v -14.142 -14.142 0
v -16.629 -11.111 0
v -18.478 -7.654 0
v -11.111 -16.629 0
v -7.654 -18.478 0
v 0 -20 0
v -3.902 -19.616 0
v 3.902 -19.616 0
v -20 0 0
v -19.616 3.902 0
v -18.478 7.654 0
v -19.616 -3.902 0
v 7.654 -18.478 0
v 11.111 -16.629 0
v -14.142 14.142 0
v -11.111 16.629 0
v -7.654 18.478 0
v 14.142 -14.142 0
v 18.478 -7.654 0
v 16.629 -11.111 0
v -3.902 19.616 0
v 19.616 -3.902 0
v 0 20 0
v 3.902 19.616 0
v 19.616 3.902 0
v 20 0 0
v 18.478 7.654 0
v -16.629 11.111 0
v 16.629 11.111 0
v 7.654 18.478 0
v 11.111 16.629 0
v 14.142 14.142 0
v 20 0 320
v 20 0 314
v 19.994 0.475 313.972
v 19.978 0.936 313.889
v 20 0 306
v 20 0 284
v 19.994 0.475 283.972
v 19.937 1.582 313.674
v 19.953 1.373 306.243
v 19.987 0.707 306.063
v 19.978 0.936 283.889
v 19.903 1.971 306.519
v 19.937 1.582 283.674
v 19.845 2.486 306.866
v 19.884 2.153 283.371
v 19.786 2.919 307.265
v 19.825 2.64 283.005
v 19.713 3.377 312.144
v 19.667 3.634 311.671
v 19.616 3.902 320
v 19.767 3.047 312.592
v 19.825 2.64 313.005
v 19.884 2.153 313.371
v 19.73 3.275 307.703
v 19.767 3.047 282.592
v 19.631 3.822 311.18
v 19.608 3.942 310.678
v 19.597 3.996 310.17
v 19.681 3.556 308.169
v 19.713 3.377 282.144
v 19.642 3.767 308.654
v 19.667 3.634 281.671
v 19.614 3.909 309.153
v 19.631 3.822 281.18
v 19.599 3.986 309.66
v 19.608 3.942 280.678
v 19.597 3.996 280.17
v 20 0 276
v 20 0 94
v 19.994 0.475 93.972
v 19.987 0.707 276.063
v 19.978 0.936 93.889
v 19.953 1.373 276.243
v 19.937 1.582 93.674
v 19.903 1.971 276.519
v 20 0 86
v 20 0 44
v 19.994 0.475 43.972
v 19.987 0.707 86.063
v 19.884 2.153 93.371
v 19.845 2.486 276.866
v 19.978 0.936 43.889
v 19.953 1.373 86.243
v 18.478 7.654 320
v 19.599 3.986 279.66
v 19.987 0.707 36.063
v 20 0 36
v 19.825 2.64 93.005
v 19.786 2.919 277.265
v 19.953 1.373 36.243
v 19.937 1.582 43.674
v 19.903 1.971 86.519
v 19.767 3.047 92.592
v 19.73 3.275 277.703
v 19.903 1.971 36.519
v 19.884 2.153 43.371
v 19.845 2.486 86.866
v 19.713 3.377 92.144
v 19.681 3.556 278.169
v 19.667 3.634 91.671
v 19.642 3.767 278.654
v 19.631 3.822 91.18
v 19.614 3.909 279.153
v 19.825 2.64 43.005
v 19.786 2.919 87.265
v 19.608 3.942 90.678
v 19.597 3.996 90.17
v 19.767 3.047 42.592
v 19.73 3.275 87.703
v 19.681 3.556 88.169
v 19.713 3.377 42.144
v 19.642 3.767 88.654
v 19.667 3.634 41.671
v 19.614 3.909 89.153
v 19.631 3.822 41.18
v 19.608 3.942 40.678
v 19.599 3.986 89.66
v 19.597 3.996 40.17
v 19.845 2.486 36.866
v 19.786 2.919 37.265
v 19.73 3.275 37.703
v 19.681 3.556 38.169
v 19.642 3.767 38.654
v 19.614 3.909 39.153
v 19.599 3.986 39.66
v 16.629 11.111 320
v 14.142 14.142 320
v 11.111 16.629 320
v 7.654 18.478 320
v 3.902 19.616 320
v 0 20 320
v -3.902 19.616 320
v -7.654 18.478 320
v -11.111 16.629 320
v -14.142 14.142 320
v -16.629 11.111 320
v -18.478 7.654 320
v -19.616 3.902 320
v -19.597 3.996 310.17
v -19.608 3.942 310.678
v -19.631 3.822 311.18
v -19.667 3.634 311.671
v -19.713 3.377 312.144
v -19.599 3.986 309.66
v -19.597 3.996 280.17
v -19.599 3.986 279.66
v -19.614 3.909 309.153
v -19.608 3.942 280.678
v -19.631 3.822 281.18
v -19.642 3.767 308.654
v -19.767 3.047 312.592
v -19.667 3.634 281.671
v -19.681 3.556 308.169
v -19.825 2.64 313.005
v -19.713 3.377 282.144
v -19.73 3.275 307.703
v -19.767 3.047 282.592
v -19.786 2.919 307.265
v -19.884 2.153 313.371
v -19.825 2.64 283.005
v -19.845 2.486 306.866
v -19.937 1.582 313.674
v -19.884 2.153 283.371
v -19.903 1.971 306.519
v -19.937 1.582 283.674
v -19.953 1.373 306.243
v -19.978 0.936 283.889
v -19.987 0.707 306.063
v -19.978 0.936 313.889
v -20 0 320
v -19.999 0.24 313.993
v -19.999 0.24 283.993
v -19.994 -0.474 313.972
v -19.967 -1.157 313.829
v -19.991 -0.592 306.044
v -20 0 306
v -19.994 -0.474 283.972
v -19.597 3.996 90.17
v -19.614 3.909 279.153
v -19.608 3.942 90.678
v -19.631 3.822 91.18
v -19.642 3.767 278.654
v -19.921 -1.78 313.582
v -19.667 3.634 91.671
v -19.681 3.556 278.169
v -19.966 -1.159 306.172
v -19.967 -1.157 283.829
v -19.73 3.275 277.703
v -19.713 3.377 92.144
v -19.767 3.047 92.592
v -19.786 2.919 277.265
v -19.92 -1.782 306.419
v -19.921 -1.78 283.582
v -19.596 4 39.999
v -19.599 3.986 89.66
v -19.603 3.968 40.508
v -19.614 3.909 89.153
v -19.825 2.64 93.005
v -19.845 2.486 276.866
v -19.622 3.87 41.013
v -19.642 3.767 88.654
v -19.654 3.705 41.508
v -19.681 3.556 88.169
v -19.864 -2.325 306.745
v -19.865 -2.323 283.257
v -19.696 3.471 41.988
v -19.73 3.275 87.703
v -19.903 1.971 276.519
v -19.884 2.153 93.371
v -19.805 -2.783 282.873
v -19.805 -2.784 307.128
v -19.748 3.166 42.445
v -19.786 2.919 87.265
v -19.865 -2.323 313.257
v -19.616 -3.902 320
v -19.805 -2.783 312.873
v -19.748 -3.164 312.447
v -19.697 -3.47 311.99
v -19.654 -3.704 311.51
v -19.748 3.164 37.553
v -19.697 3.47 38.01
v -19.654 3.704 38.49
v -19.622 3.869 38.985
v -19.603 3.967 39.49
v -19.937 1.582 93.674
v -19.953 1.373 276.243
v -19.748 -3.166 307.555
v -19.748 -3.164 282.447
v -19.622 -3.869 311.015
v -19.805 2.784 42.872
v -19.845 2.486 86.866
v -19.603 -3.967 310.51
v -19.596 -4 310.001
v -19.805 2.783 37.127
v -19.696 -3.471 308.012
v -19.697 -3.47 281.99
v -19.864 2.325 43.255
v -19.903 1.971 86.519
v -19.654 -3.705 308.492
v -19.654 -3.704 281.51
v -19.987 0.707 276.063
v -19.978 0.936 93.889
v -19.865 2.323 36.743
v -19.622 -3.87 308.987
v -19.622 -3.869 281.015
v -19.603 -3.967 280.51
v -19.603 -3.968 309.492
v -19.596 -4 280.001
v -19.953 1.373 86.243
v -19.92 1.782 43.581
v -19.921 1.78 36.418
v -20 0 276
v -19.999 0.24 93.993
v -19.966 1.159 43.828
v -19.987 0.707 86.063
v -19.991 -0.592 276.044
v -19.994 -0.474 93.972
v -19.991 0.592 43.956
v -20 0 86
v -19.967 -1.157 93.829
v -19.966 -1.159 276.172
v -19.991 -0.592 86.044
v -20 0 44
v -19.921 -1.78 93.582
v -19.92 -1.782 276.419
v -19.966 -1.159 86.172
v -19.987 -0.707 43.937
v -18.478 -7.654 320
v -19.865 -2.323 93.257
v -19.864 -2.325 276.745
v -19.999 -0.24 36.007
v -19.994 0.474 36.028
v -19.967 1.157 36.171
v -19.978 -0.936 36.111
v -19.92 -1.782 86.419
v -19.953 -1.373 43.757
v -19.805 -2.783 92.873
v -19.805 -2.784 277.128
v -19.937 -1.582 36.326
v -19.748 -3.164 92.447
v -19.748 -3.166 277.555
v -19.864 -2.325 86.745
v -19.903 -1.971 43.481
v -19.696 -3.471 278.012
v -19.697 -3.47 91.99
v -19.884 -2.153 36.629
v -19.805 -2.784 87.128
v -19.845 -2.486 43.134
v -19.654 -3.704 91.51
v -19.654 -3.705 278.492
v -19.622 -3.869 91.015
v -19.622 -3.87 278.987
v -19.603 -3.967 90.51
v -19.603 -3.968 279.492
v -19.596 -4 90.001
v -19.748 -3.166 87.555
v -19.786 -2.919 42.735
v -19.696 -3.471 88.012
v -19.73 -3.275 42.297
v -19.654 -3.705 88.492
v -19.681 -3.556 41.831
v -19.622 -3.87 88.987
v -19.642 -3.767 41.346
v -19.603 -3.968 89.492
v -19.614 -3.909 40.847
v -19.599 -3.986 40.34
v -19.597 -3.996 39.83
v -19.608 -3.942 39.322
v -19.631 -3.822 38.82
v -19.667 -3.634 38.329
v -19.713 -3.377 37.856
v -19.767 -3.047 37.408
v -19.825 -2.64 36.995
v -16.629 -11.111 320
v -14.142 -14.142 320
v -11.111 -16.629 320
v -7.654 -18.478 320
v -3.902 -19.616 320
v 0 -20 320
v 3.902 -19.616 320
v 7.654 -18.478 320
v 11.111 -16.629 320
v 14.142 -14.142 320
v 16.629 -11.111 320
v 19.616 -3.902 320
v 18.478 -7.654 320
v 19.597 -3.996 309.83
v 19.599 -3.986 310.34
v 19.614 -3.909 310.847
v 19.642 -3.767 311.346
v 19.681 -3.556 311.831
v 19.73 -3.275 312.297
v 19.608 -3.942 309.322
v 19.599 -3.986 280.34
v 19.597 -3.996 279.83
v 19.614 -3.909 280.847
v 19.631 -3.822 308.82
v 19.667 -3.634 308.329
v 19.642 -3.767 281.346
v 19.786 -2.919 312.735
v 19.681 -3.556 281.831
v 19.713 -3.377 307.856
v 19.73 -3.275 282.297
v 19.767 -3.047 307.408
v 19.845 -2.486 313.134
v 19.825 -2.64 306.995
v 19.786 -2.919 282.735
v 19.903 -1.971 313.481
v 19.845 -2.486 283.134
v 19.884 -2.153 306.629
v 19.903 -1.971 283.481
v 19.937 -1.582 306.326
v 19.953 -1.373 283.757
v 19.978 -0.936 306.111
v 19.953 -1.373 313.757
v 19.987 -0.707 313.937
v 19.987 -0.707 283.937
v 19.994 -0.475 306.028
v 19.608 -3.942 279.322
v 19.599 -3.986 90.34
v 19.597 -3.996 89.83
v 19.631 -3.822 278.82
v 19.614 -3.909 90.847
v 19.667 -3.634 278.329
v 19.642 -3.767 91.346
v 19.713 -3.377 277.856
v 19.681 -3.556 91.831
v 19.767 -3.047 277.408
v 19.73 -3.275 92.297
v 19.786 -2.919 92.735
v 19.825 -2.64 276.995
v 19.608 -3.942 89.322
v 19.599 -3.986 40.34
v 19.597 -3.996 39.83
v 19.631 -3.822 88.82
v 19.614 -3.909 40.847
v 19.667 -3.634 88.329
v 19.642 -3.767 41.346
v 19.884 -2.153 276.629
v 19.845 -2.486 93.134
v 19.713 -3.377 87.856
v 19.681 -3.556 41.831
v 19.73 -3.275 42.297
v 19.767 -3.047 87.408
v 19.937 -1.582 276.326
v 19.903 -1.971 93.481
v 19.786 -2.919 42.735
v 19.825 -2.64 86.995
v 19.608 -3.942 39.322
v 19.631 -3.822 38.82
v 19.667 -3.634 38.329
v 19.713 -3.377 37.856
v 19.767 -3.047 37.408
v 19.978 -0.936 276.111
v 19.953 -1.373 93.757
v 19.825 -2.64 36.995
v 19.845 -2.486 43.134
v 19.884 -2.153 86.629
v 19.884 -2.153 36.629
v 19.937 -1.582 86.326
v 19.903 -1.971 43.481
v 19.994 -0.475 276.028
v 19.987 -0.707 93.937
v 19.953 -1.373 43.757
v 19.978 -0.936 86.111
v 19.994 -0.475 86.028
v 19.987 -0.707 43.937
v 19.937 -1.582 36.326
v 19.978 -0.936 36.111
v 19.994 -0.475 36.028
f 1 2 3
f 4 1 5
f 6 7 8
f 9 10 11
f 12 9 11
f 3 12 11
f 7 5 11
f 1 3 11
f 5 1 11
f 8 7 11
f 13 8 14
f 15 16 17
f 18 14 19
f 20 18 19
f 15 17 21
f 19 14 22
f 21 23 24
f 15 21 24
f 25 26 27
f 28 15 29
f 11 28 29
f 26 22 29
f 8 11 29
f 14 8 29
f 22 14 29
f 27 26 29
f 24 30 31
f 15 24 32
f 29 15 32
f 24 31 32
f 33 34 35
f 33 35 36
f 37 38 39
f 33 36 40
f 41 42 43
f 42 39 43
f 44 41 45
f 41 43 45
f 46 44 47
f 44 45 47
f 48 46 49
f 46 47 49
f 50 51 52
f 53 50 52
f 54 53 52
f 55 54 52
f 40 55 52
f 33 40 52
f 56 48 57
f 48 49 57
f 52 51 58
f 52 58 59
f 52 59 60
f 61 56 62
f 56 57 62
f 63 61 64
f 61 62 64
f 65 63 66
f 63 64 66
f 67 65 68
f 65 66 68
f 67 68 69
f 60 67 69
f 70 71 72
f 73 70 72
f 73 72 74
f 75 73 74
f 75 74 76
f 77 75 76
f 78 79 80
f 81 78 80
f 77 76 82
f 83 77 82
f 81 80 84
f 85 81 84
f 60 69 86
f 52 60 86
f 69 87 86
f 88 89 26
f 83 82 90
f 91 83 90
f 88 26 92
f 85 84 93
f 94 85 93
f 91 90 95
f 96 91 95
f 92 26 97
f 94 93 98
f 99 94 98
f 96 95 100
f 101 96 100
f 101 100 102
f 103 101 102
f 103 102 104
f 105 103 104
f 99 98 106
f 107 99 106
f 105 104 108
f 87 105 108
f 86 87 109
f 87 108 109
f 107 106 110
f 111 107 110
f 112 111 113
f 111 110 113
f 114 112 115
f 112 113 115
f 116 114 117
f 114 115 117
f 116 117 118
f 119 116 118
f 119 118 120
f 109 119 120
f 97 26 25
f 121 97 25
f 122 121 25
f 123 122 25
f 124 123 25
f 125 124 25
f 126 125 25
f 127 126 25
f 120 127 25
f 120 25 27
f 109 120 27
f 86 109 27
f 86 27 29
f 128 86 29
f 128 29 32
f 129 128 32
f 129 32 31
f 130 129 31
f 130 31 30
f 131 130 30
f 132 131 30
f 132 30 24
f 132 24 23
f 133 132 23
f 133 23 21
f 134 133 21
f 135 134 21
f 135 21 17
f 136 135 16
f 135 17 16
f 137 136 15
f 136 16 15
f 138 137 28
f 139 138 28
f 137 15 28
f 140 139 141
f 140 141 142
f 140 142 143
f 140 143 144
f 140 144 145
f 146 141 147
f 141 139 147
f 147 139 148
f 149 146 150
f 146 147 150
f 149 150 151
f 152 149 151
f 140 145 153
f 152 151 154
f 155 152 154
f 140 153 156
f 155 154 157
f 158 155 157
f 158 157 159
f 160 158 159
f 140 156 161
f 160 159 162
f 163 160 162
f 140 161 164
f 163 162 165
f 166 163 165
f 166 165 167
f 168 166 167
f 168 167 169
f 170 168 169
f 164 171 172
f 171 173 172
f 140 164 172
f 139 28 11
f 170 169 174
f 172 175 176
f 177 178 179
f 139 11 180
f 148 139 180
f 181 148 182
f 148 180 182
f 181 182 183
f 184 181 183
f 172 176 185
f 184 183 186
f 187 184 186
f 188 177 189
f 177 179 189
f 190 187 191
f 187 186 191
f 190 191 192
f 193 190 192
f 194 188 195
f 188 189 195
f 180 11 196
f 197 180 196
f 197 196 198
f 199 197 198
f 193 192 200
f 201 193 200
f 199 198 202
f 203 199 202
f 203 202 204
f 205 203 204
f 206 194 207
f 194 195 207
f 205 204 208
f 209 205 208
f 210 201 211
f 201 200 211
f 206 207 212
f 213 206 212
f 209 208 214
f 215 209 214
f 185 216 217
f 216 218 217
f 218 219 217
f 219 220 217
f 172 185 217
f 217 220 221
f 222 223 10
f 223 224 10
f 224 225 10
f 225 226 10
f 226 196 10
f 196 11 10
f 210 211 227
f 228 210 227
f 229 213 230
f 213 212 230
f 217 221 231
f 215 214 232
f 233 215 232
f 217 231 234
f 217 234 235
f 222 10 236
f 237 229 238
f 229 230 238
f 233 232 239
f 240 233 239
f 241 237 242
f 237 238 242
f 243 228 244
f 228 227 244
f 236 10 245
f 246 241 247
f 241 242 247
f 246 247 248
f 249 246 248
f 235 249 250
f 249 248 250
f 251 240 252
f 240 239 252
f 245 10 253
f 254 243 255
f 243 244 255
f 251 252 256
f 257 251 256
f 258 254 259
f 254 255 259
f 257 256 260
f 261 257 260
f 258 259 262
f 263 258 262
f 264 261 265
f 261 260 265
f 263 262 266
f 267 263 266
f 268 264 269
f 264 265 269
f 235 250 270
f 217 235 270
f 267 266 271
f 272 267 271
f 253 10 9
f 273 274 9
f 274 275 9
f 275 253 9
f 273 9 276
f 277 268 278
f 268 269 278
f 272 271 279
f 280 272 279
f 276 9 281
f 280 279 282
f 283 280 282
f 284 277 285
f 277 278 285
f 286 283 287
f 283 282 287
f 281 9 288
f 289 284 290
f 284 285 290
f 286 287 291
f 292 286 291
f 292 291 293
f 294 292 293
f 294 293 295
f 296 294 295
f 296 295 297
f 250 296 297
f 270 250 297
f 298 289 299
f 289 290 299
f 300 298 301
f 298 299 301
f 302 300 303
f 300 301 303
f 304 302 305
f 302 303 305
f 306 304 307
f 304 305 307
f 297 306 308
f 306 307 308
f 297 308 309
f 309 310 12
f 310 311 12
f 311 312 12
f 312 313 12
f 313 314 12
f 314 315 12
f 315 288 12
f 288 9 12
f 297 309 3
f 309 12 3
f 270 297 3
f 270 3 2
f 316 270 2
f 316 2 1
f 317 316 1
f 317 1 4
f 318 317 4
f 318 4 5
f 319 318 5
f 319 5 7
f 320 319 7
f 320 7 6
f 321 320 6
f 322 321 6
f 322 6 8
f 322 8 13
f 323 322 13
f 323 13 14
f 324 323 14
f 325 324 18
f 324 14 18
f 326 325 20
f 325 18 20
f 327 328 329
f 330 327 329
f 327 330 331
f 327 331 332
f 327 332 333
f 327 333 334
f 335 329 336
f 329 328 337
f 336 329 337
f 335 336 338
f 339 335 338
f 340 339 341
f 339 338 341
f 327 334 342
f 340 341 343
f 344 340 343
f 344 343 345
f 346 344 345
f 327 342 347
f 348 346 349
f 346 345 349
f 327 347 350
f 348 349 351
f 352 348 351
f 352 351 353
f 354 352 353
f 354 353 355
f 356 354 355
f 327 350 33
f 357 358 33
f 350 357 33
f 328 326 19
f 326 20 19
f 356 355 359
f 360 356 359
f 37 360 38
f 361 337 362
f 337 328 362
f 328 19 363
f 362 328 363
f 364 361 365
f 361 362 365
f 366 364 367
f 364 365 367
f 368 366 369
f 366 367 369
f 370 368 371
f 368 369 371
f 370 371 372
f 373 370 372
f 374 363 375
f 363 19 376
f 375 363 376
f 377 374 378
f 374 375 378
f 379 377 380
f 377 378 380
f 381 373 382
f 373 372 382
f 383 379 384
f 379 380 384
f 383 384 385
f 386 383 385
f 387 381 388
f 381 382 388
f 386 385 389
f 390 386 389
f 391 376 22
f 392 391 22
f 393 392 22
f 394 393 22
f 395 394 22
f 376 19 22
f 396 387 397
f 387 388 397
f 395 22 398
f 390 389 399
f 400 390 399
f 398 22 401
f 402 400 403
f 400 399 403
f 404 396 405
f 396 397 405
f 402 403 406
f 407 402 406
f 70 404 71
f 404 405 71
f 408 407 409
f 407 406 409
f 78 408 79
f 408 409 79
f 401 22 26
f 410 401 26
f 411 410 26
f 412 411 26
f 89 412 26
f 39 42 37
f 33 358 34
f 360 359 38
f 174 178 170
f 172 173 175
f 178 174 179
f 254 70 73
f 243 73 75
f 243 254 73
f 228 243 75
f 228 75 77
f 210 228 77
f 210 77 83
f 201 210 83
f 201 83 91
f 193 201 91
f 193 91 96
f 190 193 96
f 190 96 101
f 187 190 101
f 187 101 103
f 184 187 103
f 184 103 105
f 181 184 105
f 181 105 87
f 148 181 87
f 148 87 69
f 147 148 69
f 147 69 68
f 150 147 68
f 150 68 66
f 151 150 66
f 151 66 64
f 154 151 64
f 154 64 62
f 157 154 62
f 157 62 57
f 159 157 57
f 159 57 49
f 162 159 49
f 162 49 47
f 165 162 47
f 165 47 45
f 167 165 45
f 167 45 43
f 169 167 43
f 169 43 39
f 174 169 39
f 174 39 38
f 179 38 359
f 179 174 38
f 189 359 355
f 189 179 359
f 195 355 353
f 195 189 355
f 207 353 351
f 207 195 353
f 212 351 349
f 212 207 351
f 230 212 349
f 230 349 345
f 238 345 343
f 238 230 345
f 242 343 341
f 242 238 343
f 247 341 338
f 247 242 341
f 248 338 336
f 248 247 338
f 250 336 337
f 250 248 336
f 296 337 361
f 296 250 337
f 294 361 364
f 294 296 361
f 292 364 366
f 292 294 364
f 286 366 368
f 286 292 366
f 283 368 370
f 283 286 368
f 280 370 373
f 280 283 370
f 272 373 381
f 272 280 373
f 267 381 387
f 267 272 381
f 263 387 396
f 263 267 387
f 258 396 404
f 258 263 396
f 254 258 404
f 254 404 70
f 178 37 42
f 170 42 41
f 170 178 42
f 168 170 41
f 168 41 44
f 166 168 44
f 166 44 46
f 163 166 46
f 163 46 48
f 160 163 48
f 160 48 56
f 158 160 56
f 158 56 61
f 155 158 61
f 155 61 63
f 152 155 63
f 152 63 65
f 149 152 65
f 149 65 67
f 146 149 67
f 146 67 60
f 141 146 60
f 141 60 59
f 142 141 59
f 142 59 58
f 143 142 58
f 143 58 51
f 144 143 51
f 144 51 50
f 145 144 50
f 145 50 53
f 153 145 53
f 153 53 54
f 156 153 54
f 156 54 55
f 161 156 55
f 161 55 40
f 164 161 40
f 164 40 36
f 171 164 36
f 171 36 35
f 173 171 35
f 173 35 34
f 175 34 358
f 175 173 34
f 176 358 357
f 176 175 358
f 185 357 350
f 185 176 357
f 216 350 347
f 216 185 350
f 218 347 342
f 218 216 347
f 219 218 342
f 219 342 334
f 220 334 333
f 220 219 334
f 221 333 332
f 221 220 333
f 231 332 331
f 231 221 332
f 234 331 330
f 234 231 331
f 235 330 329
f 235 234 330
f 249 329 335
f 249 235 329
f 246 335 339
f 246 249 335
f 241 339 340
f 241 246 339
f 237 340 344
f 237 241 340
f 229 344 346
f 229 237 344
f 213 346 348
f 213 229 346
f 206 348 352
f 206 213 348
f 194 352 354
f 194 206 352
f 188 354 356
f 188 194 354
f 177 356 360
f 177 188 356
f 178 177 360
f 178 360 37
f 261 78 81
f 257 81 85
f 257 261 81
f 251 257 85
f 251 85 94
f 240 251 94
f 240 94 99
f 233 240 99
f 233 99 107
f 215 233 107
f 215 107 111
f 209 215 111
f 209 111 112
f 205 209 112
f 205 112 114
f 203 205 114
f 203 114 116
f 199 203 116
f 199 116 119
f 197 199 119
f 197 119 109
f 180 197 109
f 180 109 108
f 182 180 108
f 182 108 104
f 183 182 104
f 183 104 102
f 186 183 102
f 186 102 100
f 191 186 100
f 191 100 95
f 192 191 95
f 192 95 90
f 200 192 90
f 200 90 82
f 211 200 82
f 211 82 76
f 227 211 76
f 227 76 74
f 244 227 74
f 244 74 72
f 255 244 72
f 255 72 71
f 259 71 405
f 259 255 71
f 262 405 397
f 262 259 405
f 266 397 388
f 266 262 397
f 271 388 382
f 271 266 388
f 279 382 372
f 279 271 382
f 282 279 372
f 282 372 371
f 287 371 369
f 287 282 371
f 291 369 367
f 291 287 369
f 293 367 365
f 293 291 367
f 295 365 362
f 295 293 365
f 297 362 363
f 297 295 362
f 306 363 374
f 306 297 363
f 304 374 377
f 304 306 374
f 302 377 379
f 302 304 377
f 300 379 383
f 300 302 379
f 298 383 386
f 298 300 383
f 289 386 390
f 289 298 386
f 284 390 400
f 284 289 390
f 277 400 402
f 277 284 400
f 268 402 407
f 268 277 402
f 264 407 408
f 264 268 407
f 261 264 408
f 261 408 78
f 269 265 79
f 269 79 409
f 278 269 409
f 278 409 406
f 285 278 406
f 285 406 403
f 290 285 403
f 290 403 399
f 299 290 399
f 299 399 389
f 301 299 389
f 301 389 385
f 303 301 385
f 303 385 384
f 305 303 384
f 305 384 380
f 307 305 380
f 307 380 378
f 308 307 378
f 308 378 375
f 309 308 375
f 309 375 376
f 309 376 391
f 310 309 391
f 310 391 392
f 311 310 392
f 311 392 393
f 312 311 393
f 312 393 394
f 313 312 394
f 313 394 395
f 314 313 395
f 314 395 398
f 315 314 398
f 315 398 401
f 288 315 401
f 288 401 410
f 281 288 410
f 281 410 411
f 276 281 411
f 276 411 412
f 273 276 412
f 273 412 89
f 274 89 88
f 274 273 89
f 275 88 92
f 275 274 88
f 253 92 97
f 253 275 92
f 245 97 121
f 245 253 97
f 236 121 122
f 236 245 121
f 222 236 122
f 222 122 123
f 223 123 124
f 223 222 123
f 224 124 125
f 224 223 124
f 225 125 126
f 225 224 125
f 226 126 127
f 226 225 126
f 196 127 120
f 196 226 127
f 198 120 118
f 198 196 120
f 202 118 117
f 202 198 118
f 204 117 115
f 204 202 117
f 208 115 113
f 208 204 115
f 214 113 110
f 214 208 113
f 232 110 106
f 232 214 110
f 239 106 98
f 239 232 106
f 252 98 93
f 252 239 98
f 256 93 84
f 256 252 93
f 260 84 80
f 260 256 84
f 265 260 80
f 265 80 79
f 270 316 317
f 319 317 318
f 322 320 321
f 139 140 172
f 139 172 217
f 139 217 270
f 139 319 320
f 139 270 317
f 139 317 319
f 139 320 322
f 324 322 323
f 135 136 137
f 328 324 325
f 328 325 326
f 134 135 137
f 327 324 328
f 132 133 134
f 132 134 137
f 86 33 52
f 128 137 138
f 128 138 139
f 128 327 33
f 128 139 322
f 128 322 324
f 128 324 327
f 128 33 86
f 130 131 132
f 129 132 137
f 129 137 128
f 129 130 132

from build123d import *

# Parameters (mm, degrees)
SKETCH1_R               = 20
BOSS_EXTRUDE1_DEPTH     = 320
CUT_EXTRUDE1_DEPTH      = 322.247568084
CUT_EXTRUDE1_DEPTH_BACK = 322.247568084
SKETCH2_R               = 4


with BuildPart() as part:
    # Sketch1 → Boss-Extrude1 (new body)
    with BuildSketch(Plane.XY):
        Circle(SKETCH1_R)
    extrude(amount=BOSS_EXTRUDE1_DEPTH)

    # Sketch2 → Cut-Extrude1 (cut, two sides: drawn at the far end of the back side and taken through both)
    with BuildSketch(Plane(origin=(0, 0, 0), x_dir=(0, 0, -1), z_dir=(1, 0, 0)).offset(-CUT_EXTRUDE1_DEPTH_BACK)):
        with Locations(Location((-40, 0, 0), (0, 0, 180))):
            Circle(SKETCH2_R)
        with Locations((-90, 0)):
            Circle(SKETCH2_R)
        with Locations((-310, 0)):
            Circle(SKETCH2_R)
        with Locations((-280, 0)):
            Circle(SKETCH2_R)
    extrude(amount=CUT_EXTRUDE1_DEPTH + CUT_EXTRUDE1_DEPTH_BACK, mode=Mode.SUBTRACT)


solid = part.part
